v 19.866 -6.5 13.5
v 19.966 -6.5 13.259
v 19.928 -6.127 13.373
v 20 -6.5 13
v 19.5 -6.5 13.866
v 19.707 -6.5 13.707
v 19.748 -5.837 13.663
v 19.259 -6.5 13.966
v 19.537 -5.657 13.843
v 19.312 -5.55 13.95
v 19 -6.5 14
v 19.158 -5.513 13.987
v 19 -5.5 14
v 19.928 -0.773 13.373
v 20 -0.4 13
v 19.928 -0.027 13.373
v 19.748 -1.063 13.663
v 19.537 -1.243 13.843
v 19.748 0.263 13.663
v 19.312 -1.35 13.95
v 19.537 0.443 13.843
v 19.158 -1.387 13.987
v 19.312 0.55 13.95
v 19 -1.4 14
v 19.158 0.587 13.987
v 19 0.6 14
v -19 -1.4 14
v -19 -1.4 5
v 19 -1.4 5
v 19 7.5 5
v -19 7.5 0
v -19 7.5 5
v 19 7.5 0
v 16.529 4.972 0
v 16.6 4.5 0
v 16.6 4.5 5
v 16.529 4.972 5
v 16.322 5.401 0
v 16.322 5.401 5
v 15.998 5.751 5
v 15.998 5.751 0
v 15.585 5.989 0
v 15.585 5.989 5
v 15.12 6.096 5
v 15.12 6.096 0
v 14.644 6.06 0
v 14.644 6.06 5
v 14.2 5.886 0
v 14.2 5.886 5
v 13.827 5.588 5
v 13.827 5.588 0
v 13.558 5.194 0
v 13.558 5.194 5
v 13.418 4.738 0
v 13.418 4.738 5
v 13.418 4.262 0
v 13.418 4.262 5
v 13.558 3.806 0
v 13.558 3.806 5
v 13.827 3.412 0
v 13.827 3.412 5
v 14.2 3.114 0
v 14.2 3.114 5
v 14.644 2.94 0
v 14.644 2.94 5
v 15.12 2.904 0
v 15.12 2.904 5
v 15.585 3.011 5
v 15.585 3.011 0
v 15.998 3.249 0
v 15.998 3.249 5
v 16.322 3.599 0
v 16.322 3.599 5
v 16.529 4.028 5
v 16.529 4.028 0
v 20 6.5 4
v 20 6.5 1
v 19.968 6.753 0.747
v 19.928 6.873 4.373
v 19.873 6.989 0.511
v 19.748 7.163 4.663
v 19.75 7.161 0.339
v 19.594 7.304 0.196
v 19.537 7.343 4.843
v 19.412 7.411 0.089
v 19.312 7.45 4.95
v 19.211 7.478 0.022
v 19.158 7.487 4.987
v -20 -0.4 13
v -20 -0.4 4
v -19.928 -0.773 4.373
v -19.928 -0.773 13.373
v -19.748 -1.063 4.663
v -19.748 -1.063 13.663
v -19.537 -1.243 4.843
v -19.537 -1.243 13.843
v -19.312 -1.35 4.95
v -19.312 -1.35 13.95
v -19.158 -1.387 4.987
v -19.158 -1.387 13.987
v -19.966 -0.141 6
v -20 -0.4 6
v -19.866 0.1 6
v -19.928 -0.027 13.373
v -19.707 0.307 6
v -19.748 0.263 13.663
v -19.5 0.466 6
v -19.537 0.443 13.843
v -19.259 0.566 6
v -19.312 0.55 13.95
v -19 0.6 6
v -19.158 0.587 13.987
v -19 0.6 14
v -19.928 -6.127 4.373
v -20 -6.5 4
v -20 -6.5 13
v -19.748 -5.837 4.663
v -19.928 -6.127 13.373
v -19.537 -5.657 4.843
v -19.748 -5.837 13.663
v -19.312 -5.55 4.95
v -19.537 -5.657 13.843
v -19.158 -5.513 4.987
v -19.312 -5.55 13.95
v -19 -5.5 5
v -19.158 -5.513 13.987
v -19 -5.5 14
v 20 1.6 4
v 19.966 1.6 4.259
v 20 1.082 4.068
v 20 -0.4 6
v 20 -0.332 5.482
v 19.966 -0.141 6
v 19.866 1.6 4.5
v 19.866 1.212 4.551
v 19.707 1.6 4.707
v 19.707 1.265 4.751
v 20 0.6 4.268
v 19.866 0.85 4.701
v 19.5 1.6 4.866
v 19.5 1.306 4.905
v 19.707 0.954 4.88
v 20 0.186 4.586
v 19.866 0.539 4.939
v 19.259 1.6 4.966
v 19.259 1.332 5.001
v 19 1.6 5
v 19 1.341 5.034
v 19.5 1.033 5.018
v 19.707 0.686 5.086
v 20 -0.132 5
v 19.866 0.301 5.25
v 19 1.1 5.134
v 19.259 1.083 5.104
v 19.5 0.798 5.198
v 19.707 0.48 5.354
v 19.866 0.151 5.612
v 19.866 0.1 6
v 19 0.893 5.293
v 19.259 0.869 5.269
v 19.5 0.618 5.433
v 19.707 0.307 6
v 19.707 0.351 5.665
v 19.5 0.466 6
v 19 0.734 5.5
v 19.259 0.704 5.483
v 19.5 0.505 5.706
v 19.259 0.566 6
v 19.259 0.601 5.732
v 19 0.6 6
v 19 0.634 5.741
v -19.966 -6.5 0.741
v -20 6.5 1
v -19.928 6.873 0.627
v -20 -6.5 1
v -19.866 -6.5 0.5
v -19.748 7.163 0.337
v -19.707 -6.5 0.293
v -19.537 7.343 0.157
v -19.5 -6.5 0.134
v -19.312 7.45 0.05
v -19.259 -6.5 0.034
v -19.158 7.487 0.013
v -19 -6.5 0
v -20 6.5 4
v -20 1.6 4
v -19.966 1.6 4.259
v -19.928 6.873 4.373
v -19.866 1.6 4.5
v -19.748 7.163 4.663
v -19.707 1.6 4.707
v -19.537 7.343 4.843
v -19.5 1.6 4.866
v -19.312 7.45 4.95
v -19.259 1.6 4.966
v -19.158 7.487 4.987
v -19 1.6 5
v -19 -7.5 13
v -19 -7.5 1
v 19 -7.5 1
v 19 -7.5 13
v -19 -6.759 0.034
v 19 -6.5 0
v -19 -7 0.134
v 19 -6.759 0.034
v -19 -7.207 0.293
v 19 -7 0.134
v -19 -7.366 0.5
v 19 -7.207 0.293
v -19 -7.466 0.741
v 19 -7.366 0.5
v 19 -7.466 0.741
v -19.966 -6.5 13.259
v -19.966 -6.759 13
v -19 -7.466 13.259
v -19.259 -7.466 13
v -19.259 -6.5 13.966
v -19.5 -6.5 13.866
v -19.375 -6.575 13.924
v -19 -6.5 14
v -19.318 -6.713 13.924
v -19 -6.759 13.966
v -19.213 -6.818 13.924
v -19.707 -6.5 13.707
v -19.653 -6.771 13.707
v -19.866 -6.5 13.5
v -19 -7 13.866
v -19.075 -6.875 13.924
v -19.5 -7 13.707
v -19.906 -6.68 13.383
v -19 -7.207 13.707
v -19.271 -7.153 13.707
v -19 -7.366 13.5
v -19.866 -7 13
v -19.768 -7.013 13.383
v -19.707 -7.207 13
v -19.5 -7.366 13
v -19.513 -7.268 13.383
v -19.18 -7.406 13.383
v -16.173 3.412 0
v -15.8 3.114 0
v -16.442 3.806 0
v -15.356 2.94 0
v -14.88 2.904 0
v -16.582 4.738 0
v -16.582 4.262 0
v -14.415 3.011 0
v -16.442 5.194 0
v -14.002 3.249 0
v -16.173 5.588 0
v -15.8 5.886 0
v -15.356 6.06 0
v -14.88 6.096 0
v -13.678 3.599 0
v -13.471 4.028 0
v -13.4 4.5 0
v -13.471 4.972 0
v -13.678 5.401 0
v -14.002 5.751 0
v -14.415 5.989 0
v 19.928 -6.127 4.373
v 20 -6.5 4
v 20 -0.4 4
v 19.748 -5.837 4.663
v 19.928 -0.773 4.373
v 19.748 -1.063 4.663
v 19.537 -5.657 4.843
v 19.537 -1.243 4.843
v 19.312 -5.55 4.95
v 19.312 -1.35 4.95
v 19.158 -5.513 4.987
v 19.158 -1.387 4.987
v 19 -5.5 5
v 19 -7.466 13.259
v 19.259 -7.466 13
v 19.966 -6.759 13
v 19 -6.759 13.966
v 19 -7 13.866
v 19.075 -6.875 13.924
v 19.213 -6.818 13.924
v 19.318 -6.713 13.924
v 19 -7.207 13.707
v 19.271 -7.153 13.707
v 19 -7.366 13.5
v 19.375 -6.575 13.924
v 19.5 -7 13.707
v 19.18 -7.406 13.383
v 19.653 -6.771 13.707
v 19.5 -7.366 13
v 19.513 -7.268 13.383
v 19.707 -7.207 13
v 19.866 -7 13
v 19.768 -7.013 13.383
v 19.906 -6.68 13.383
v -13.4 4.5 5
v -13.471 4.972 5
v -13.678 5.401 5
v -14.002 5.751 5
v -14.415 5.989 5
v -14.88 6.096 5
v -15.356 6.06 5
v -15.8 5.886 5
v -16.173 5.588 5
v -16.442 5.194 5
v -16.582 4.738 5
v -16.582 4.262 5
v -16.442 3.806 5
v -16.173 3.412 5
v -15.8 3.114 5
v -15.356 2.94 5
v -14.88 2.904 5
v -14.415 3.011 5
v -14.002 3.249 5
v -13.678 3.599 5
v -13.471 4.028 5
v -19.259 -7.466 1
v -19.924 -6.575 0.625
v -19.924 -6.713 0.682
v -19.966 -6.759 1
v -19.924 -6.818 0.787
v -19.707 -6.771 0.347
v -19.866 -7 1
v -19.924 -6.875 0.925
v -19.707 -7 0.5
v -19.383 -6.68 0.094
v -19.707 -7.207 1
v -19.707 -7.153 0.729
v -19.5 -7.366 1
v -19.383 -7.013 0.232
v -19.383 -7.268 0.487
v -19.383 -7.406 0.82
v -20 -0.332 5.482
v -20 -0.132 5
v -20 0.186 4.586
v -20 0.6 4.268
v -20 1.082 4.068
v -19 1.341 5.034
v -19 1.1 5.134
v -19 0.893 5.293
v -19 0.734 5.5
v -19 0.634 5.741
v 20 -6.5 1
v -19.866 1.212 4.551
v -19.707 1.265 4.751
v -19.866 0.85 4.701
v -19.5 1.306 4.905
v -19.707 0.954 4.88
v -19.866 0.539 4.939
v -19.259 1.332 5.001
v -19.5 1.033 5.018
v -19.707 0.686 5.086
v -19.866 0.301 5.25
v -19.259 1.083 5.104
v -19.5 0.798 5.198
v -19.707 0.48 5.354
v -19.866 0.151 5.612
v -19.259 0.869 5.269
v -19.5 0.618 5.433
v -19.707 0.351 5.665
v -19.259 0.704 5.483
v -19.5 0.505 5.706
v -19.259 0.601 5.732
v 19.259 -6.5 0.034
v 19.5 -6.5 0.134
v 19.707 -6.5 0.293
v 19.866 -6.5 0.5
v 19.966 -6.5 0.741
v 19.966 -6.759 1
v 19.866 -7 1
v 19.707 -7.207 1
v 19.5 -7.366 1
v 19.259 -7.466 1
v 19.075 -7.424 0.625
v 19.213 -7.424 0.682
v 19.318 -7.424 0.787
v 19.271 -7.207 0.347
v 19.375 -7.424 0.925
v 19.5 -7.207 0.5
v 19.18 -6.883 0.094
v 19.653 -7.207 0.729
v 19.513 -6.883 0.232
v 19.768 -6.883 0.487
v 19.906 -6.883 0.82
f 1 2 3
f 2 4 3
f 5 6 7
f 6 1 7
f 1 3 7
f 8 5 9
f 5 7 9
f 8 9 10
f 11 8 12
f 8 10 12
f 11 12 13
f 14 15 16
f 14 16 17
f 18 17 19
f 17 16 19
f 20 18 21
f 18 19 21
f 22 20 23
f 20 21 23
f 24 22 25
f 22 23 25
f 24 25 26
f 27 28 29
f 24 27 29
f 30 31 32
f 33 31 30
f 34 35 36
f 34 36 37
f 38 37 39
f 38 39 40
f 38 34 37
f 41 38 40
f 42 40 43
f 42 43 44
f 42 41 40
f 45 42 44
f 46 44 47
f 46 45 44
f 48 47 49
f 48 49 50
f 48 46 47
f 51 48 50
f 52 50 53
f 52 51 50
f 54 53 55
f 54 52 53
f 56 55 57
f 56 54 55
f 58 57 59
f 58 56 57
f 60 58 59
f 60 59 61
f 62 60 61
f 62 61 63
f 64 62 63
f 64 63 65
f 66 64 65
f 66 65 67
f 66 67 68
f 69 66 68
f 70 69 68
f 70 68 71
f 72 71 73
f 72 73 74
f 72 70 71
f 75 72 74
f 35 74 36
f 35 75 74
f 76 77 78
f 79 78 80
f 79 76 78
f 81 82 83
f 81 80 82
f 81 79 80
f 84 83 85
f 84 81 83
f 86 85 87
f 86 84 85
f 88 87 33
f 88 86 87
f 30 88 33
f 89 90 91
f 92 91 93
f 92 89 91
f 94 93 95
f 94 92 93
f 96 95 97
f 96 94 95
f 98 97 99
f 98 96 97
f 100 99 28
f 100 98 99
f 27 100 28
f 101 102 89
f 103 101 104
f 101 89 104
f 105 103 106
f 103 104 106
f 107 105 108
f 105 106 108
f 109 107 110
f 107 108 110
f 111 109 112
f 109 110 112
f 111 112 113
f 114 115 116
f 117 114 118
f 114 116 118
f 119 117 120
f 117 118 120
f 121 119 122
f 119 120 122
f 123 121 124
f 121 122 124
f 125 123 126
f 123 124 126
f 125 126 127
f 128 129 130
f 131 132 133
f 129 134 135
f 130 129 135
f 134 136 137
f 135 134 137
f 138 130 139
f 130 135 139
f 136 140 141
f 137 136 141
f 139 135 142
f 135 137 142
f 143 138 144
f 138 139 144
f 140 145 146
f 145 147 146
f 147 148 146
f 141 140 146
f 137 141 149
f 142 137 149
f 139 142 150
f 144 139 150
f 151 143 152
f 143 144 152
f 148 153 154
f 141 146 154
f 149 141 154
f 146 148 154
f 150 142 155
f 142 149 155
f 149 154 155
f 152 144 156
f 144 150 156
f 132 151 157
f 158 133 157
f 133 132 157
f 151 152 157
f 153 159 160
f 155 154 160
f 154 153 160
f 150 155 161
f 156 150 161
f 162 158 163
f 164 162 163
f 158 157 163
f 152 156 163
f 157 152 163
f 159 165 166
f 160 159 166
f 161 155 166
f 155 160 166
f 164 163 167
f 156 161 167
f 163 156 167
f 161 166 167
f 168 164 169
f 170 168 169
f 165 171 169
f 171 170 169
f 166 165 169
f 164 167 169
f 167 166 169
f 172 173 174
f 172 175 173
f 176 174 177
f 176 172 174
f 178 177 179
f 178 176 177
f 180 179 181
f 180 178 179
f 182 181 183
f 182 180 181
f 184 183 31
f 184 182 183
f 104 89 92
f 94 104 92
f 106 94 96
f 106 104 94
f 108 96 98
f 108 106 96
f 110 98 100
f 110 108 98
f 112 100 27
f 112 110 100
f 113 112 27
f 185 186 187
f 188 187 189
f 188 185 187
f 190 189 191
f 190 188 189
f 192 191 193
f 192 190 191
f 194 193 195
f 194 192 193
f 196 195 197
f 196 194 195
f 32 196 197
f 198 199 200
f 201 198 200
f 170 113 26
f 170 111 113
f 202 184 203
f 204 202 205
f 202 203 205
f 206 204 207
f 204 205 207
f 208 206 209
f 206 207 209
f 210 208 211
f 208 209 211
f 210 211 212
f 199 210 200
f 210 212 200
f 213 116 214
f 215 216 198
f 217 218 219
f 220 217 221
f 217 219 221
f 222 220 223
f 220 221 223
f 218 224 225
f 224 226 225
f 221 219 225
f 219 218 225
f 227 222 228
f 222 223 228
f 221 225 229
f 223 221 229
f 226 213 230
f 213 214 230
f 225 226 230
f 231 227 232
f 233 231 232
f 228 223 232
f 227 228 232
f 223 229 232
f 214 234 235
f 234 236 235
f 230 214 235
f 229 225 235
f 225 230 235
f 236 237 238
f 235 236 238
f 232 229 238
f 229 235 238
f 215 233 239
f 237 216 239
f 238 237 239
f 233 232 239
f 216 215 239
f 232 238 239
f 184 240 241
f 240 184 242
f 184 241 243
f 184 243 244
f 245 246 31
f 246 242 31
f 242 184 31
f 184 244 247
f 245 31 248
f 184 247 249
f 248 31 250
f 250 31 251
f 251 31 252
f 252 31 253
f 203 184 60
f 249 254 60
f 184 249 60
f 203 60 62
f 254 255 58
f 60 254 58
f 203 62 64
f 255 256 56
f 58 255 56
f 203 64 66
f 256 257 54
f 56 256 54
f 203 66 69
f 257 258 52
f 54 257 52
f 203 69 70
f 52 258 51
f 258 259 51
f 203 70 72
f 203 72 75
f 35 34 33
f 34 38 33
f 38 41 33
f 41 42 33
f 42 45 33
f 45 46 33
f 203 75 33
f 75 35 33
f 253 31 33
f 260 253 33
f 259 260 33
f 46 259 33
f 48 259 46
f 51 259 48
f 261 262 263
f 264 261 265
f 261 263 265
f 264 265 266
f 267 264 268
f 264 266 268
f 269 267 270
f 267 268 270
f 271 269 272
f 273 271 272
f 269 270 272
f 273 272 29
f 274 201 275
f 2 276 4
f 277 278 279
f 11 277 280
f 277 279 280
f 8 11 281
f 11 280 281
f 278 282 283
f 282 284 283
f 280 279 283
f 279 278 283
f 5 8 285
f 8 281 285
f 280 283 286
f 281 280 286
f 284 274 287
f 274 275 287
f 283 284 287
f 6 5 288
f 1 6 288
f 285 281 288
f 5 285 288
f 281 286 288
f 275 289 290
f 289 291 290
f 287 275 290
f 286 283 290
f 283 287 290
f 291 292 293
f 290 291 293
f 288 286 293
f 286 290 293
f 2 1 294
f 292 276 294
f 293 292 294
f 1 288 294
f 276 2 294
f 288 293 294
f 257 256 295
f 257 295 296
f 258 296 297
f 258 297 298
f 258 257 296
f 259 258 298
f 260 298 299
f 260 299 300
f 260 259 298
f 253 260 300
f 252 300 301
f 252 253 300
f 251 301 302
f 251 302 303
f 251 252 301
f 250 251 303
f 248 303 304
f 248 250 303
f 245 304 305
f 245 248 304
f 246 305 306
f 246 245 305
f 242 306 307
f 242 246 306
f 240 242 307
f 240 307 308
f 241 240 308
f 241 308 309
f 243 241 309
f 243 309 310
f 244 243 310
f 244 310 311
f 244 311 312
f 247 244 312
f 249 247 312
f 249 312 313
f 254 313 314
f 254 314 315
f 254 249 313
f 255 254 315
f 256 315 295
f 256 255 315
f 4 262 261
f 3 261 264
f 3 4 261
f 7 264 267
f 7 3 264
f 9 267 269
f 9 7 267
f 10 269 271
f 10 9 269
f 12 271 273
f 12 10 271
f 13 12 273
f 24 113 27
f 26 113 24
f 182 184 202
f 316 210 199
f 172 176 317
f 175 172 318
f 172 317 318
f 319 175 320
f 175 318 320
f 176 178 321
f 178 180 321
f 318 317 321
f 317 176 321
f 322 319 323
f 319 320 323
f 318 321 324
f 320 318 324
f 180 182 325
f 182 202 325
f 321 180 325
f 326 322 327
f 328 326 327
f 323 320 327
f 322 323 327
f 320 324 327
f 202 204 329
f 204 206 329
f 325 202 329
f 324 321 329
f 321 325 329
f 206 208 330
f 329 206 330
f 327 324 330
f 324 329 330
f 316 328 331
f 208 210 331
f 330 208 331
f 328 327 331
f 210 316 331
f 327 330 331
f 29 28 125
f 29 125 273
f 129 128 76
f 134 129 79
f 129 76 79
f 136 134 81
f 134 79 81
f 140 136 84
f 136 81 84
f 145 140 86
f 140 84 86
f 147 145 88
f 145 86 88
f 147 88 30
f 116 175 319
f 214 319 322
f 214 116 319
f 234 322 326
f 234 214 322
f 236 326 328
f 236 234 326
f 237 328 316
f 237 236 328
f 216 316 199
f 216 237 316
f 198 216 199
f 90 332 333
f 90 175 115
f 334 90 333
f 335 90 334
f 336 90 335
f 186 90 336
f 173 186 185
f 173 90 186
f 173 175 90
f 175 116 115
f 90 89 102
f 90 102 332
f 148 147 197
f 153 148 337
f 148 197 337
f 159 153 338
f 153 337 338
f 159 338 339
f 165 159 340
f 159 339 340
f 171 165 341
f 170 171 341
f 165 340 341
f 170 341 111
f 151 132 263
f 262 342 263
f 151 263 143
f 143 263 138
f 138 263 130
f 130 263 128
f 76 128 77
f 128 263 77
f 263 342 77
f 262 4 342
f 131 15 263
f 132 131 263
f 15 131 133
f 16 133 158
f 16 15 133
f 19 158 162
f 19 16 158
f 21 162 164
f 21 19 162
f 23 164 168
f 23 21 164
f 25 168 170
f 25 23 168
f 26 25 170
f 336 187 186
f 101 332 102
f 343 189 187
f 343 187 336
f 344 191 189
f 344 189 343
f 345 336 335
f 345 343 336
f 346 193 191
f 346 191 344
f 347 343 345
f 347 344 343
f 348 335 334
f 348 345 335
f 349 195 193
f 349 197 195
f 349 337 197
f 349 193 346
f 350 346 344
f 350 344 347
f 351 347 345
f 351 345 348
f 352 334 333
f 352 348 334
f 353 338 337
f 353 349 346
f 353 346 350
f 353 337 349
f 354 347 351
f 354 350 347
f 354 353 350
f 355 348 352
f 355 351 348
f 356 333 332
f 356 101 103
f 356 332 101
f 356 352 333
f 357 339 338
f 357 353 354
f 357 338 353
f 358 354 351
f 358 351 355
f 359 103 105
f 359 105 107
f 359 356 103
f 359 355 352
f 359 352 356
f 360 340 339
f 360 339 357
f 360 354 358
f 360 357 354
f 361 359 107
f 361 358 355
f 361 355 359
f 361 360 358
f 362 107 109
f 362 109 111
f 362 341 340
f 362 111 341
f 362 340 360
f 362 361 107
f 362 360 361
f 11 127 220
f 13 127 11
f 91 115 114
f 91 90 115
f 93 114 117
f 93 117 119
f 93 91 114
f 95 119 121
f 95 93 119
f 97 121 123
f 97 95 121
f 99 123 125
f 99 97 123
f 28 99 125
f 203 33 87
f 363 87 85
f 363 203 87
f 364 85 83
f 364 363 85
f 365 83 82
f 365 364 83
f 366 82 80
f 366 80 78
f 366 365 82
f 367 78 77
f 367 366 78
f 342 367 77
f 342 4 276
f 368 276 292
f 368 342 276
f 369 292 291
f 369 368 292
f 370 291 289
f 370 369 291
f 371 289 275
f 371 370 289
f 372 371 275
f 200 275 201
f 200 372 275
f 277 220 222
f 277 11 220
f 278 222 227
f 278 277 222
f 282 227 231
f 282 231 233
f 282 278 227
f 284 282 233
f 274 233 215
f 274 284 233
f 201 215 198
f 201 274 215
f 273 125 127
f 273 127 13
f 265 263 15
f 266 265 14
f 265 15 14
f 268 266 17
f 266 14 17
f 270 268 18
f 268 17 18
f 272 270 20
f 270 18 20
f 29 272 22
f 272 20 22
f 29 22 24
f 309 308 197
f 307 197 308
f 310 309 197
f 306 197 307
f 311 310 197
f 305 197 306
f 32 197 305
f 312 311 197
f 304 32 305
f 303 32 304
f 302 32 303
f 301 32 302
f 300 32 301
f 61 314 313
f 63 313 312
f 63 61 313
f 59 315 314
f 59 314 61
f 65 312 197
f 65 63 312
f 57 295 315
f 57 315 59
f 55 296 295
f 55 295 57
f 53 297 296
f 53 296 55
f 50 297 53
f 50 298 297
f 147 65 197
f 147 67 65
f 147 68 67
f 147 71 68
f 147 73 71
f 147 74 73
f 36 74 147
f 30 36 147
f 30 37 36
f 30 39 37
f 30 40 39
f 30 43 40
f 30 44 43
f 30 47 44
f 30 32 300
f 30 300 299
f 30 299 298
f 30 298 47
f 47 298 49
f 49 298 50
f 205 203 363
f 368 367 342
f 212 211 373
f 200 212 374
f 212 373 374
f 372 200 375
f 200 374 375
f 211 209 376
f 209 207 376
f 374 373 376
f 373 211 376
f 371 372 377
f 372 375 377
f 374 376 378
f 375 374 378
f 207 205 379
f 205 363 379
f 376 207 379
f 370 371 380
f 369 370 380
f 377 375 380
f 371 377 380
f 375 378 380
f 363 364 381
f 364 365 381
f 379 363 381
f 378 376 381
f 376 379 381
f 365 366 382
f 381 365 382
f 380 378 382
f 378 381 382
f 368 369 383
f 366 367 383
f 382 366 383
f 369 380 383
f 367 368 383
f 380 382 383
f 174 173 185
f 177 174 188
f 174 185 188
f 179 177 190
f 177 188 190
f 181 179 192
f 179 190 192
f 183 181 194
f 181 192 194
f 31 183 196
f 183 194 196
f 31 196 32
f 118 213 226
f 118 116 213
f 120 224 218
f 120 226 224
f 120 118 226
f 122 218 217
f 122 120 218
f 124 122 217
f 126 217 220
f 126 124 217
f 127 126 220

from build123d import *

# Parameters (mm, degrees)
SKETCH2_W           = 40
SKETCH2_H           = 6.9
SKETCH2_R           = 1.6
SKETCH2_H_2         = 2
SKETCH2_H_3         = 4.1
BOSS_EXTRUDE1_DEPTH = 5
SKETCH2_3_W         = 40
SKETCH2_3_H         = 2
BOSS_EXTRUDE2_DEPTH = 14
FILLET1_R           = 1


with BuildPart() as part:
    # Sketch2 → Boss-Extrude1 (new body)
    # profile 1 of 4: a face of its own
    with BuildSketch(Plane.XY):
        with Locations((0, 4.05)):
            Rectangle(SKETCH2_W, SKETCH2_H)
        with Locations((-15, 4.5)):
            Circle(SKETCH2_R, mode=Mode.SUBTRACT)
        with Locations((15, 4.5)):
            Circle(SKETCH2_R, mode=Mode.SUBTRACT)
    # profile 2 of 4: a face of its own
    with BuildSketch(Plane.XY):
        with Locations((0, -0.4)):
            Rectangle(SKETCH2_W, SKETCH2_H_2)
    # profile 3 of 4: a face of its own
    with BuildSketch(Plane.XY):
        with Locations((0, -3.45)):
            Rectangle(SKETCH2_W, SKETCH2_H_3)
    # profile 4 of 4: a face of its own
    with BuildSketch(Plane.XY):
        with Locations((0, -6.5)):
            Rectangle(SKETCH2_W, SKETCH2_H_2)
    extrude(amount=BOSS_EXTRUDE1_DEPTH)

    # Sketch2<3> → Boss-Extrude2 (add)
    with BuildSketch(Plane.XY):
        with Locations((0, -0.4)):
            Rectangle(SKETCH2_3_W, SKETCH2_3_H)
        with Locations((0, -6.5)):
            Rectangle(SKETCH2_3_W, SKETCH2_3_H)
    extrude(amount=BOSS_EXTRUDE2_DEPTH)

    # Fillet1
    fillet1_edges = [part.edges().sort_by_distance(p)[0] for p in [
        (20, 0, 0),
        (0, -7.5, 0),
        (-20, 0, 0),
        (-20, 7.5, 2.5),
        (20, 7.5, 2.5),
        (20, -7.5, 7),
        (-20, -7.5, 7),
        (-20, 4.05, 5),
        (20, 4.05, 5),
        (-20, 0.6, 9.5),
        (-20, -0.4, 14),
        (-20, -1.4, 9.5),
        (20, -1.4, 9.5),
        (20, 0.6, 9.5),
        (0, 0.6, 5),
        (20, -0.4, 14),
        (20, -3.45, 5),
        (-20, -3.45, 5),
        (20, -5.5, 9.5),
        (-20, -5.5, 9.5),
        (-20, -6.5, 14),
        (0, -7.5, 14),
        (20, -6.5, 14),
    ]]
    fillet(fillet1_edges, radius=FILLET1_R - 0.0001)  # a hair under: the kernel refuses the full size


solid = part.part
